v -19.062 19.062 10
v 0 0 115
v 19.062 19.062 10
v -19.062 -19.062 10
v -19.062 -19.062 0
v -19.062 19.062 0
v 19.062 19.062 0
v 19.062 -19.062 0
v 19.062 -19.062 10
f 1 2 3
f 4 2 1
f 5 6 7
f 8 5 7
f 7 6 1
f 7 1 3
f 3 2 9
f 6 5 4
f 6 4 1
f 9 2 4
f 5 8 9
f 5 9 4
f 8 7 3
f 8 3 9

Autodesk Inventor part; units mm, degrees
ref_plane "YZ Plane" through (0, 0, 0) normal (1, 0, 0) x (0, 1, 0)
ref_plane "XZ Plane" through (0, 0, 0) normal (0, 1, 0) x (-1, 0, 0)
ref_plane "XY Plane" through (0, 0, 0) normal (0, 0, 1) x (1, 0, 0)
sketch "Absorber-Base" plane through (0, 0, 0) normal (0, 0, 1) x (1, 0, 0)
  line L0 (-19.0625, 19.0625) -> (19.0625, 19.0625)
  line L1 (19.0625, 19.0625) -> (19.0625, -19.0625)
  line L2 (19.0625, -19.0625) -> (-19.0625, -19.0625)
  line L3 (-19.0625, -19.0625) -> (-19.0625, 19.0625)
  line L4 (-19.0625, 19.0625) -> (19.0625, -19.0625) construction
  line L5 (19.0625, 19.0625) -> (-19.0625, -19.0625) construction
  point P0 (0, 0)
  dimension "d0" = 38.125
extrude "Gesamtvolumen" add sketch "Absorber-Base" along normal blind 115
sketch "Skizze2" plane through (0, 0, 0) normal (0, 1, 0) x (-1, 0, 0)
  line L0 (-28, 0) -> (28, 0) projected
  line L1 (19.0625, 0) -> (19.0625, 115) projected
  line L2 (-19.0625, 0) -> (-19.0625, 115) projected
  line L3 (19.0625, 0) -> (-19.0625, 0)
  line L4 (-19.0625, 0) -> (-19.0625, 10)
  line L5 (-19.0625, 10) -> (19.0625, 10)
  line L6 (19.0625, 10) -> (19.0625, 0)
  line L7 (-19.0625, 115) -> (19.0625, 115) projected
  line L8 (0, 115) -> (19.0625, 10)
  line L9 (0, 115) -> (-19.0625, 10)
  point P0 (0, 0)
  point P1 (19.0625, 10)
  dimension "d6" = 10
extrude "Cutaway" cut sketch "Skizze2" along normal mid plane 38.125 contours L2 L7 L9 | L8 L7 L1
pattern_circular "Runde Anordnung1" count 2 over 90 about axis through (0, 0, -10) along (0, 0, 1) of "Cutaway"
equation "\"d0\" = Base_Seitenlänge"
equation "\"d1\" = Gesamthöhe"
equation "\"d6\" = Base_Höhe"
equation "\"d7\" = Base_Seitenlänge"
equation "\"Base_Seitenlänge\" = 38.125"
equation "\"Base_Höhe\" = 10"
equation "\"Gesamthöhe\" = 115"
properties part number "HF-Absorber-dummy"
